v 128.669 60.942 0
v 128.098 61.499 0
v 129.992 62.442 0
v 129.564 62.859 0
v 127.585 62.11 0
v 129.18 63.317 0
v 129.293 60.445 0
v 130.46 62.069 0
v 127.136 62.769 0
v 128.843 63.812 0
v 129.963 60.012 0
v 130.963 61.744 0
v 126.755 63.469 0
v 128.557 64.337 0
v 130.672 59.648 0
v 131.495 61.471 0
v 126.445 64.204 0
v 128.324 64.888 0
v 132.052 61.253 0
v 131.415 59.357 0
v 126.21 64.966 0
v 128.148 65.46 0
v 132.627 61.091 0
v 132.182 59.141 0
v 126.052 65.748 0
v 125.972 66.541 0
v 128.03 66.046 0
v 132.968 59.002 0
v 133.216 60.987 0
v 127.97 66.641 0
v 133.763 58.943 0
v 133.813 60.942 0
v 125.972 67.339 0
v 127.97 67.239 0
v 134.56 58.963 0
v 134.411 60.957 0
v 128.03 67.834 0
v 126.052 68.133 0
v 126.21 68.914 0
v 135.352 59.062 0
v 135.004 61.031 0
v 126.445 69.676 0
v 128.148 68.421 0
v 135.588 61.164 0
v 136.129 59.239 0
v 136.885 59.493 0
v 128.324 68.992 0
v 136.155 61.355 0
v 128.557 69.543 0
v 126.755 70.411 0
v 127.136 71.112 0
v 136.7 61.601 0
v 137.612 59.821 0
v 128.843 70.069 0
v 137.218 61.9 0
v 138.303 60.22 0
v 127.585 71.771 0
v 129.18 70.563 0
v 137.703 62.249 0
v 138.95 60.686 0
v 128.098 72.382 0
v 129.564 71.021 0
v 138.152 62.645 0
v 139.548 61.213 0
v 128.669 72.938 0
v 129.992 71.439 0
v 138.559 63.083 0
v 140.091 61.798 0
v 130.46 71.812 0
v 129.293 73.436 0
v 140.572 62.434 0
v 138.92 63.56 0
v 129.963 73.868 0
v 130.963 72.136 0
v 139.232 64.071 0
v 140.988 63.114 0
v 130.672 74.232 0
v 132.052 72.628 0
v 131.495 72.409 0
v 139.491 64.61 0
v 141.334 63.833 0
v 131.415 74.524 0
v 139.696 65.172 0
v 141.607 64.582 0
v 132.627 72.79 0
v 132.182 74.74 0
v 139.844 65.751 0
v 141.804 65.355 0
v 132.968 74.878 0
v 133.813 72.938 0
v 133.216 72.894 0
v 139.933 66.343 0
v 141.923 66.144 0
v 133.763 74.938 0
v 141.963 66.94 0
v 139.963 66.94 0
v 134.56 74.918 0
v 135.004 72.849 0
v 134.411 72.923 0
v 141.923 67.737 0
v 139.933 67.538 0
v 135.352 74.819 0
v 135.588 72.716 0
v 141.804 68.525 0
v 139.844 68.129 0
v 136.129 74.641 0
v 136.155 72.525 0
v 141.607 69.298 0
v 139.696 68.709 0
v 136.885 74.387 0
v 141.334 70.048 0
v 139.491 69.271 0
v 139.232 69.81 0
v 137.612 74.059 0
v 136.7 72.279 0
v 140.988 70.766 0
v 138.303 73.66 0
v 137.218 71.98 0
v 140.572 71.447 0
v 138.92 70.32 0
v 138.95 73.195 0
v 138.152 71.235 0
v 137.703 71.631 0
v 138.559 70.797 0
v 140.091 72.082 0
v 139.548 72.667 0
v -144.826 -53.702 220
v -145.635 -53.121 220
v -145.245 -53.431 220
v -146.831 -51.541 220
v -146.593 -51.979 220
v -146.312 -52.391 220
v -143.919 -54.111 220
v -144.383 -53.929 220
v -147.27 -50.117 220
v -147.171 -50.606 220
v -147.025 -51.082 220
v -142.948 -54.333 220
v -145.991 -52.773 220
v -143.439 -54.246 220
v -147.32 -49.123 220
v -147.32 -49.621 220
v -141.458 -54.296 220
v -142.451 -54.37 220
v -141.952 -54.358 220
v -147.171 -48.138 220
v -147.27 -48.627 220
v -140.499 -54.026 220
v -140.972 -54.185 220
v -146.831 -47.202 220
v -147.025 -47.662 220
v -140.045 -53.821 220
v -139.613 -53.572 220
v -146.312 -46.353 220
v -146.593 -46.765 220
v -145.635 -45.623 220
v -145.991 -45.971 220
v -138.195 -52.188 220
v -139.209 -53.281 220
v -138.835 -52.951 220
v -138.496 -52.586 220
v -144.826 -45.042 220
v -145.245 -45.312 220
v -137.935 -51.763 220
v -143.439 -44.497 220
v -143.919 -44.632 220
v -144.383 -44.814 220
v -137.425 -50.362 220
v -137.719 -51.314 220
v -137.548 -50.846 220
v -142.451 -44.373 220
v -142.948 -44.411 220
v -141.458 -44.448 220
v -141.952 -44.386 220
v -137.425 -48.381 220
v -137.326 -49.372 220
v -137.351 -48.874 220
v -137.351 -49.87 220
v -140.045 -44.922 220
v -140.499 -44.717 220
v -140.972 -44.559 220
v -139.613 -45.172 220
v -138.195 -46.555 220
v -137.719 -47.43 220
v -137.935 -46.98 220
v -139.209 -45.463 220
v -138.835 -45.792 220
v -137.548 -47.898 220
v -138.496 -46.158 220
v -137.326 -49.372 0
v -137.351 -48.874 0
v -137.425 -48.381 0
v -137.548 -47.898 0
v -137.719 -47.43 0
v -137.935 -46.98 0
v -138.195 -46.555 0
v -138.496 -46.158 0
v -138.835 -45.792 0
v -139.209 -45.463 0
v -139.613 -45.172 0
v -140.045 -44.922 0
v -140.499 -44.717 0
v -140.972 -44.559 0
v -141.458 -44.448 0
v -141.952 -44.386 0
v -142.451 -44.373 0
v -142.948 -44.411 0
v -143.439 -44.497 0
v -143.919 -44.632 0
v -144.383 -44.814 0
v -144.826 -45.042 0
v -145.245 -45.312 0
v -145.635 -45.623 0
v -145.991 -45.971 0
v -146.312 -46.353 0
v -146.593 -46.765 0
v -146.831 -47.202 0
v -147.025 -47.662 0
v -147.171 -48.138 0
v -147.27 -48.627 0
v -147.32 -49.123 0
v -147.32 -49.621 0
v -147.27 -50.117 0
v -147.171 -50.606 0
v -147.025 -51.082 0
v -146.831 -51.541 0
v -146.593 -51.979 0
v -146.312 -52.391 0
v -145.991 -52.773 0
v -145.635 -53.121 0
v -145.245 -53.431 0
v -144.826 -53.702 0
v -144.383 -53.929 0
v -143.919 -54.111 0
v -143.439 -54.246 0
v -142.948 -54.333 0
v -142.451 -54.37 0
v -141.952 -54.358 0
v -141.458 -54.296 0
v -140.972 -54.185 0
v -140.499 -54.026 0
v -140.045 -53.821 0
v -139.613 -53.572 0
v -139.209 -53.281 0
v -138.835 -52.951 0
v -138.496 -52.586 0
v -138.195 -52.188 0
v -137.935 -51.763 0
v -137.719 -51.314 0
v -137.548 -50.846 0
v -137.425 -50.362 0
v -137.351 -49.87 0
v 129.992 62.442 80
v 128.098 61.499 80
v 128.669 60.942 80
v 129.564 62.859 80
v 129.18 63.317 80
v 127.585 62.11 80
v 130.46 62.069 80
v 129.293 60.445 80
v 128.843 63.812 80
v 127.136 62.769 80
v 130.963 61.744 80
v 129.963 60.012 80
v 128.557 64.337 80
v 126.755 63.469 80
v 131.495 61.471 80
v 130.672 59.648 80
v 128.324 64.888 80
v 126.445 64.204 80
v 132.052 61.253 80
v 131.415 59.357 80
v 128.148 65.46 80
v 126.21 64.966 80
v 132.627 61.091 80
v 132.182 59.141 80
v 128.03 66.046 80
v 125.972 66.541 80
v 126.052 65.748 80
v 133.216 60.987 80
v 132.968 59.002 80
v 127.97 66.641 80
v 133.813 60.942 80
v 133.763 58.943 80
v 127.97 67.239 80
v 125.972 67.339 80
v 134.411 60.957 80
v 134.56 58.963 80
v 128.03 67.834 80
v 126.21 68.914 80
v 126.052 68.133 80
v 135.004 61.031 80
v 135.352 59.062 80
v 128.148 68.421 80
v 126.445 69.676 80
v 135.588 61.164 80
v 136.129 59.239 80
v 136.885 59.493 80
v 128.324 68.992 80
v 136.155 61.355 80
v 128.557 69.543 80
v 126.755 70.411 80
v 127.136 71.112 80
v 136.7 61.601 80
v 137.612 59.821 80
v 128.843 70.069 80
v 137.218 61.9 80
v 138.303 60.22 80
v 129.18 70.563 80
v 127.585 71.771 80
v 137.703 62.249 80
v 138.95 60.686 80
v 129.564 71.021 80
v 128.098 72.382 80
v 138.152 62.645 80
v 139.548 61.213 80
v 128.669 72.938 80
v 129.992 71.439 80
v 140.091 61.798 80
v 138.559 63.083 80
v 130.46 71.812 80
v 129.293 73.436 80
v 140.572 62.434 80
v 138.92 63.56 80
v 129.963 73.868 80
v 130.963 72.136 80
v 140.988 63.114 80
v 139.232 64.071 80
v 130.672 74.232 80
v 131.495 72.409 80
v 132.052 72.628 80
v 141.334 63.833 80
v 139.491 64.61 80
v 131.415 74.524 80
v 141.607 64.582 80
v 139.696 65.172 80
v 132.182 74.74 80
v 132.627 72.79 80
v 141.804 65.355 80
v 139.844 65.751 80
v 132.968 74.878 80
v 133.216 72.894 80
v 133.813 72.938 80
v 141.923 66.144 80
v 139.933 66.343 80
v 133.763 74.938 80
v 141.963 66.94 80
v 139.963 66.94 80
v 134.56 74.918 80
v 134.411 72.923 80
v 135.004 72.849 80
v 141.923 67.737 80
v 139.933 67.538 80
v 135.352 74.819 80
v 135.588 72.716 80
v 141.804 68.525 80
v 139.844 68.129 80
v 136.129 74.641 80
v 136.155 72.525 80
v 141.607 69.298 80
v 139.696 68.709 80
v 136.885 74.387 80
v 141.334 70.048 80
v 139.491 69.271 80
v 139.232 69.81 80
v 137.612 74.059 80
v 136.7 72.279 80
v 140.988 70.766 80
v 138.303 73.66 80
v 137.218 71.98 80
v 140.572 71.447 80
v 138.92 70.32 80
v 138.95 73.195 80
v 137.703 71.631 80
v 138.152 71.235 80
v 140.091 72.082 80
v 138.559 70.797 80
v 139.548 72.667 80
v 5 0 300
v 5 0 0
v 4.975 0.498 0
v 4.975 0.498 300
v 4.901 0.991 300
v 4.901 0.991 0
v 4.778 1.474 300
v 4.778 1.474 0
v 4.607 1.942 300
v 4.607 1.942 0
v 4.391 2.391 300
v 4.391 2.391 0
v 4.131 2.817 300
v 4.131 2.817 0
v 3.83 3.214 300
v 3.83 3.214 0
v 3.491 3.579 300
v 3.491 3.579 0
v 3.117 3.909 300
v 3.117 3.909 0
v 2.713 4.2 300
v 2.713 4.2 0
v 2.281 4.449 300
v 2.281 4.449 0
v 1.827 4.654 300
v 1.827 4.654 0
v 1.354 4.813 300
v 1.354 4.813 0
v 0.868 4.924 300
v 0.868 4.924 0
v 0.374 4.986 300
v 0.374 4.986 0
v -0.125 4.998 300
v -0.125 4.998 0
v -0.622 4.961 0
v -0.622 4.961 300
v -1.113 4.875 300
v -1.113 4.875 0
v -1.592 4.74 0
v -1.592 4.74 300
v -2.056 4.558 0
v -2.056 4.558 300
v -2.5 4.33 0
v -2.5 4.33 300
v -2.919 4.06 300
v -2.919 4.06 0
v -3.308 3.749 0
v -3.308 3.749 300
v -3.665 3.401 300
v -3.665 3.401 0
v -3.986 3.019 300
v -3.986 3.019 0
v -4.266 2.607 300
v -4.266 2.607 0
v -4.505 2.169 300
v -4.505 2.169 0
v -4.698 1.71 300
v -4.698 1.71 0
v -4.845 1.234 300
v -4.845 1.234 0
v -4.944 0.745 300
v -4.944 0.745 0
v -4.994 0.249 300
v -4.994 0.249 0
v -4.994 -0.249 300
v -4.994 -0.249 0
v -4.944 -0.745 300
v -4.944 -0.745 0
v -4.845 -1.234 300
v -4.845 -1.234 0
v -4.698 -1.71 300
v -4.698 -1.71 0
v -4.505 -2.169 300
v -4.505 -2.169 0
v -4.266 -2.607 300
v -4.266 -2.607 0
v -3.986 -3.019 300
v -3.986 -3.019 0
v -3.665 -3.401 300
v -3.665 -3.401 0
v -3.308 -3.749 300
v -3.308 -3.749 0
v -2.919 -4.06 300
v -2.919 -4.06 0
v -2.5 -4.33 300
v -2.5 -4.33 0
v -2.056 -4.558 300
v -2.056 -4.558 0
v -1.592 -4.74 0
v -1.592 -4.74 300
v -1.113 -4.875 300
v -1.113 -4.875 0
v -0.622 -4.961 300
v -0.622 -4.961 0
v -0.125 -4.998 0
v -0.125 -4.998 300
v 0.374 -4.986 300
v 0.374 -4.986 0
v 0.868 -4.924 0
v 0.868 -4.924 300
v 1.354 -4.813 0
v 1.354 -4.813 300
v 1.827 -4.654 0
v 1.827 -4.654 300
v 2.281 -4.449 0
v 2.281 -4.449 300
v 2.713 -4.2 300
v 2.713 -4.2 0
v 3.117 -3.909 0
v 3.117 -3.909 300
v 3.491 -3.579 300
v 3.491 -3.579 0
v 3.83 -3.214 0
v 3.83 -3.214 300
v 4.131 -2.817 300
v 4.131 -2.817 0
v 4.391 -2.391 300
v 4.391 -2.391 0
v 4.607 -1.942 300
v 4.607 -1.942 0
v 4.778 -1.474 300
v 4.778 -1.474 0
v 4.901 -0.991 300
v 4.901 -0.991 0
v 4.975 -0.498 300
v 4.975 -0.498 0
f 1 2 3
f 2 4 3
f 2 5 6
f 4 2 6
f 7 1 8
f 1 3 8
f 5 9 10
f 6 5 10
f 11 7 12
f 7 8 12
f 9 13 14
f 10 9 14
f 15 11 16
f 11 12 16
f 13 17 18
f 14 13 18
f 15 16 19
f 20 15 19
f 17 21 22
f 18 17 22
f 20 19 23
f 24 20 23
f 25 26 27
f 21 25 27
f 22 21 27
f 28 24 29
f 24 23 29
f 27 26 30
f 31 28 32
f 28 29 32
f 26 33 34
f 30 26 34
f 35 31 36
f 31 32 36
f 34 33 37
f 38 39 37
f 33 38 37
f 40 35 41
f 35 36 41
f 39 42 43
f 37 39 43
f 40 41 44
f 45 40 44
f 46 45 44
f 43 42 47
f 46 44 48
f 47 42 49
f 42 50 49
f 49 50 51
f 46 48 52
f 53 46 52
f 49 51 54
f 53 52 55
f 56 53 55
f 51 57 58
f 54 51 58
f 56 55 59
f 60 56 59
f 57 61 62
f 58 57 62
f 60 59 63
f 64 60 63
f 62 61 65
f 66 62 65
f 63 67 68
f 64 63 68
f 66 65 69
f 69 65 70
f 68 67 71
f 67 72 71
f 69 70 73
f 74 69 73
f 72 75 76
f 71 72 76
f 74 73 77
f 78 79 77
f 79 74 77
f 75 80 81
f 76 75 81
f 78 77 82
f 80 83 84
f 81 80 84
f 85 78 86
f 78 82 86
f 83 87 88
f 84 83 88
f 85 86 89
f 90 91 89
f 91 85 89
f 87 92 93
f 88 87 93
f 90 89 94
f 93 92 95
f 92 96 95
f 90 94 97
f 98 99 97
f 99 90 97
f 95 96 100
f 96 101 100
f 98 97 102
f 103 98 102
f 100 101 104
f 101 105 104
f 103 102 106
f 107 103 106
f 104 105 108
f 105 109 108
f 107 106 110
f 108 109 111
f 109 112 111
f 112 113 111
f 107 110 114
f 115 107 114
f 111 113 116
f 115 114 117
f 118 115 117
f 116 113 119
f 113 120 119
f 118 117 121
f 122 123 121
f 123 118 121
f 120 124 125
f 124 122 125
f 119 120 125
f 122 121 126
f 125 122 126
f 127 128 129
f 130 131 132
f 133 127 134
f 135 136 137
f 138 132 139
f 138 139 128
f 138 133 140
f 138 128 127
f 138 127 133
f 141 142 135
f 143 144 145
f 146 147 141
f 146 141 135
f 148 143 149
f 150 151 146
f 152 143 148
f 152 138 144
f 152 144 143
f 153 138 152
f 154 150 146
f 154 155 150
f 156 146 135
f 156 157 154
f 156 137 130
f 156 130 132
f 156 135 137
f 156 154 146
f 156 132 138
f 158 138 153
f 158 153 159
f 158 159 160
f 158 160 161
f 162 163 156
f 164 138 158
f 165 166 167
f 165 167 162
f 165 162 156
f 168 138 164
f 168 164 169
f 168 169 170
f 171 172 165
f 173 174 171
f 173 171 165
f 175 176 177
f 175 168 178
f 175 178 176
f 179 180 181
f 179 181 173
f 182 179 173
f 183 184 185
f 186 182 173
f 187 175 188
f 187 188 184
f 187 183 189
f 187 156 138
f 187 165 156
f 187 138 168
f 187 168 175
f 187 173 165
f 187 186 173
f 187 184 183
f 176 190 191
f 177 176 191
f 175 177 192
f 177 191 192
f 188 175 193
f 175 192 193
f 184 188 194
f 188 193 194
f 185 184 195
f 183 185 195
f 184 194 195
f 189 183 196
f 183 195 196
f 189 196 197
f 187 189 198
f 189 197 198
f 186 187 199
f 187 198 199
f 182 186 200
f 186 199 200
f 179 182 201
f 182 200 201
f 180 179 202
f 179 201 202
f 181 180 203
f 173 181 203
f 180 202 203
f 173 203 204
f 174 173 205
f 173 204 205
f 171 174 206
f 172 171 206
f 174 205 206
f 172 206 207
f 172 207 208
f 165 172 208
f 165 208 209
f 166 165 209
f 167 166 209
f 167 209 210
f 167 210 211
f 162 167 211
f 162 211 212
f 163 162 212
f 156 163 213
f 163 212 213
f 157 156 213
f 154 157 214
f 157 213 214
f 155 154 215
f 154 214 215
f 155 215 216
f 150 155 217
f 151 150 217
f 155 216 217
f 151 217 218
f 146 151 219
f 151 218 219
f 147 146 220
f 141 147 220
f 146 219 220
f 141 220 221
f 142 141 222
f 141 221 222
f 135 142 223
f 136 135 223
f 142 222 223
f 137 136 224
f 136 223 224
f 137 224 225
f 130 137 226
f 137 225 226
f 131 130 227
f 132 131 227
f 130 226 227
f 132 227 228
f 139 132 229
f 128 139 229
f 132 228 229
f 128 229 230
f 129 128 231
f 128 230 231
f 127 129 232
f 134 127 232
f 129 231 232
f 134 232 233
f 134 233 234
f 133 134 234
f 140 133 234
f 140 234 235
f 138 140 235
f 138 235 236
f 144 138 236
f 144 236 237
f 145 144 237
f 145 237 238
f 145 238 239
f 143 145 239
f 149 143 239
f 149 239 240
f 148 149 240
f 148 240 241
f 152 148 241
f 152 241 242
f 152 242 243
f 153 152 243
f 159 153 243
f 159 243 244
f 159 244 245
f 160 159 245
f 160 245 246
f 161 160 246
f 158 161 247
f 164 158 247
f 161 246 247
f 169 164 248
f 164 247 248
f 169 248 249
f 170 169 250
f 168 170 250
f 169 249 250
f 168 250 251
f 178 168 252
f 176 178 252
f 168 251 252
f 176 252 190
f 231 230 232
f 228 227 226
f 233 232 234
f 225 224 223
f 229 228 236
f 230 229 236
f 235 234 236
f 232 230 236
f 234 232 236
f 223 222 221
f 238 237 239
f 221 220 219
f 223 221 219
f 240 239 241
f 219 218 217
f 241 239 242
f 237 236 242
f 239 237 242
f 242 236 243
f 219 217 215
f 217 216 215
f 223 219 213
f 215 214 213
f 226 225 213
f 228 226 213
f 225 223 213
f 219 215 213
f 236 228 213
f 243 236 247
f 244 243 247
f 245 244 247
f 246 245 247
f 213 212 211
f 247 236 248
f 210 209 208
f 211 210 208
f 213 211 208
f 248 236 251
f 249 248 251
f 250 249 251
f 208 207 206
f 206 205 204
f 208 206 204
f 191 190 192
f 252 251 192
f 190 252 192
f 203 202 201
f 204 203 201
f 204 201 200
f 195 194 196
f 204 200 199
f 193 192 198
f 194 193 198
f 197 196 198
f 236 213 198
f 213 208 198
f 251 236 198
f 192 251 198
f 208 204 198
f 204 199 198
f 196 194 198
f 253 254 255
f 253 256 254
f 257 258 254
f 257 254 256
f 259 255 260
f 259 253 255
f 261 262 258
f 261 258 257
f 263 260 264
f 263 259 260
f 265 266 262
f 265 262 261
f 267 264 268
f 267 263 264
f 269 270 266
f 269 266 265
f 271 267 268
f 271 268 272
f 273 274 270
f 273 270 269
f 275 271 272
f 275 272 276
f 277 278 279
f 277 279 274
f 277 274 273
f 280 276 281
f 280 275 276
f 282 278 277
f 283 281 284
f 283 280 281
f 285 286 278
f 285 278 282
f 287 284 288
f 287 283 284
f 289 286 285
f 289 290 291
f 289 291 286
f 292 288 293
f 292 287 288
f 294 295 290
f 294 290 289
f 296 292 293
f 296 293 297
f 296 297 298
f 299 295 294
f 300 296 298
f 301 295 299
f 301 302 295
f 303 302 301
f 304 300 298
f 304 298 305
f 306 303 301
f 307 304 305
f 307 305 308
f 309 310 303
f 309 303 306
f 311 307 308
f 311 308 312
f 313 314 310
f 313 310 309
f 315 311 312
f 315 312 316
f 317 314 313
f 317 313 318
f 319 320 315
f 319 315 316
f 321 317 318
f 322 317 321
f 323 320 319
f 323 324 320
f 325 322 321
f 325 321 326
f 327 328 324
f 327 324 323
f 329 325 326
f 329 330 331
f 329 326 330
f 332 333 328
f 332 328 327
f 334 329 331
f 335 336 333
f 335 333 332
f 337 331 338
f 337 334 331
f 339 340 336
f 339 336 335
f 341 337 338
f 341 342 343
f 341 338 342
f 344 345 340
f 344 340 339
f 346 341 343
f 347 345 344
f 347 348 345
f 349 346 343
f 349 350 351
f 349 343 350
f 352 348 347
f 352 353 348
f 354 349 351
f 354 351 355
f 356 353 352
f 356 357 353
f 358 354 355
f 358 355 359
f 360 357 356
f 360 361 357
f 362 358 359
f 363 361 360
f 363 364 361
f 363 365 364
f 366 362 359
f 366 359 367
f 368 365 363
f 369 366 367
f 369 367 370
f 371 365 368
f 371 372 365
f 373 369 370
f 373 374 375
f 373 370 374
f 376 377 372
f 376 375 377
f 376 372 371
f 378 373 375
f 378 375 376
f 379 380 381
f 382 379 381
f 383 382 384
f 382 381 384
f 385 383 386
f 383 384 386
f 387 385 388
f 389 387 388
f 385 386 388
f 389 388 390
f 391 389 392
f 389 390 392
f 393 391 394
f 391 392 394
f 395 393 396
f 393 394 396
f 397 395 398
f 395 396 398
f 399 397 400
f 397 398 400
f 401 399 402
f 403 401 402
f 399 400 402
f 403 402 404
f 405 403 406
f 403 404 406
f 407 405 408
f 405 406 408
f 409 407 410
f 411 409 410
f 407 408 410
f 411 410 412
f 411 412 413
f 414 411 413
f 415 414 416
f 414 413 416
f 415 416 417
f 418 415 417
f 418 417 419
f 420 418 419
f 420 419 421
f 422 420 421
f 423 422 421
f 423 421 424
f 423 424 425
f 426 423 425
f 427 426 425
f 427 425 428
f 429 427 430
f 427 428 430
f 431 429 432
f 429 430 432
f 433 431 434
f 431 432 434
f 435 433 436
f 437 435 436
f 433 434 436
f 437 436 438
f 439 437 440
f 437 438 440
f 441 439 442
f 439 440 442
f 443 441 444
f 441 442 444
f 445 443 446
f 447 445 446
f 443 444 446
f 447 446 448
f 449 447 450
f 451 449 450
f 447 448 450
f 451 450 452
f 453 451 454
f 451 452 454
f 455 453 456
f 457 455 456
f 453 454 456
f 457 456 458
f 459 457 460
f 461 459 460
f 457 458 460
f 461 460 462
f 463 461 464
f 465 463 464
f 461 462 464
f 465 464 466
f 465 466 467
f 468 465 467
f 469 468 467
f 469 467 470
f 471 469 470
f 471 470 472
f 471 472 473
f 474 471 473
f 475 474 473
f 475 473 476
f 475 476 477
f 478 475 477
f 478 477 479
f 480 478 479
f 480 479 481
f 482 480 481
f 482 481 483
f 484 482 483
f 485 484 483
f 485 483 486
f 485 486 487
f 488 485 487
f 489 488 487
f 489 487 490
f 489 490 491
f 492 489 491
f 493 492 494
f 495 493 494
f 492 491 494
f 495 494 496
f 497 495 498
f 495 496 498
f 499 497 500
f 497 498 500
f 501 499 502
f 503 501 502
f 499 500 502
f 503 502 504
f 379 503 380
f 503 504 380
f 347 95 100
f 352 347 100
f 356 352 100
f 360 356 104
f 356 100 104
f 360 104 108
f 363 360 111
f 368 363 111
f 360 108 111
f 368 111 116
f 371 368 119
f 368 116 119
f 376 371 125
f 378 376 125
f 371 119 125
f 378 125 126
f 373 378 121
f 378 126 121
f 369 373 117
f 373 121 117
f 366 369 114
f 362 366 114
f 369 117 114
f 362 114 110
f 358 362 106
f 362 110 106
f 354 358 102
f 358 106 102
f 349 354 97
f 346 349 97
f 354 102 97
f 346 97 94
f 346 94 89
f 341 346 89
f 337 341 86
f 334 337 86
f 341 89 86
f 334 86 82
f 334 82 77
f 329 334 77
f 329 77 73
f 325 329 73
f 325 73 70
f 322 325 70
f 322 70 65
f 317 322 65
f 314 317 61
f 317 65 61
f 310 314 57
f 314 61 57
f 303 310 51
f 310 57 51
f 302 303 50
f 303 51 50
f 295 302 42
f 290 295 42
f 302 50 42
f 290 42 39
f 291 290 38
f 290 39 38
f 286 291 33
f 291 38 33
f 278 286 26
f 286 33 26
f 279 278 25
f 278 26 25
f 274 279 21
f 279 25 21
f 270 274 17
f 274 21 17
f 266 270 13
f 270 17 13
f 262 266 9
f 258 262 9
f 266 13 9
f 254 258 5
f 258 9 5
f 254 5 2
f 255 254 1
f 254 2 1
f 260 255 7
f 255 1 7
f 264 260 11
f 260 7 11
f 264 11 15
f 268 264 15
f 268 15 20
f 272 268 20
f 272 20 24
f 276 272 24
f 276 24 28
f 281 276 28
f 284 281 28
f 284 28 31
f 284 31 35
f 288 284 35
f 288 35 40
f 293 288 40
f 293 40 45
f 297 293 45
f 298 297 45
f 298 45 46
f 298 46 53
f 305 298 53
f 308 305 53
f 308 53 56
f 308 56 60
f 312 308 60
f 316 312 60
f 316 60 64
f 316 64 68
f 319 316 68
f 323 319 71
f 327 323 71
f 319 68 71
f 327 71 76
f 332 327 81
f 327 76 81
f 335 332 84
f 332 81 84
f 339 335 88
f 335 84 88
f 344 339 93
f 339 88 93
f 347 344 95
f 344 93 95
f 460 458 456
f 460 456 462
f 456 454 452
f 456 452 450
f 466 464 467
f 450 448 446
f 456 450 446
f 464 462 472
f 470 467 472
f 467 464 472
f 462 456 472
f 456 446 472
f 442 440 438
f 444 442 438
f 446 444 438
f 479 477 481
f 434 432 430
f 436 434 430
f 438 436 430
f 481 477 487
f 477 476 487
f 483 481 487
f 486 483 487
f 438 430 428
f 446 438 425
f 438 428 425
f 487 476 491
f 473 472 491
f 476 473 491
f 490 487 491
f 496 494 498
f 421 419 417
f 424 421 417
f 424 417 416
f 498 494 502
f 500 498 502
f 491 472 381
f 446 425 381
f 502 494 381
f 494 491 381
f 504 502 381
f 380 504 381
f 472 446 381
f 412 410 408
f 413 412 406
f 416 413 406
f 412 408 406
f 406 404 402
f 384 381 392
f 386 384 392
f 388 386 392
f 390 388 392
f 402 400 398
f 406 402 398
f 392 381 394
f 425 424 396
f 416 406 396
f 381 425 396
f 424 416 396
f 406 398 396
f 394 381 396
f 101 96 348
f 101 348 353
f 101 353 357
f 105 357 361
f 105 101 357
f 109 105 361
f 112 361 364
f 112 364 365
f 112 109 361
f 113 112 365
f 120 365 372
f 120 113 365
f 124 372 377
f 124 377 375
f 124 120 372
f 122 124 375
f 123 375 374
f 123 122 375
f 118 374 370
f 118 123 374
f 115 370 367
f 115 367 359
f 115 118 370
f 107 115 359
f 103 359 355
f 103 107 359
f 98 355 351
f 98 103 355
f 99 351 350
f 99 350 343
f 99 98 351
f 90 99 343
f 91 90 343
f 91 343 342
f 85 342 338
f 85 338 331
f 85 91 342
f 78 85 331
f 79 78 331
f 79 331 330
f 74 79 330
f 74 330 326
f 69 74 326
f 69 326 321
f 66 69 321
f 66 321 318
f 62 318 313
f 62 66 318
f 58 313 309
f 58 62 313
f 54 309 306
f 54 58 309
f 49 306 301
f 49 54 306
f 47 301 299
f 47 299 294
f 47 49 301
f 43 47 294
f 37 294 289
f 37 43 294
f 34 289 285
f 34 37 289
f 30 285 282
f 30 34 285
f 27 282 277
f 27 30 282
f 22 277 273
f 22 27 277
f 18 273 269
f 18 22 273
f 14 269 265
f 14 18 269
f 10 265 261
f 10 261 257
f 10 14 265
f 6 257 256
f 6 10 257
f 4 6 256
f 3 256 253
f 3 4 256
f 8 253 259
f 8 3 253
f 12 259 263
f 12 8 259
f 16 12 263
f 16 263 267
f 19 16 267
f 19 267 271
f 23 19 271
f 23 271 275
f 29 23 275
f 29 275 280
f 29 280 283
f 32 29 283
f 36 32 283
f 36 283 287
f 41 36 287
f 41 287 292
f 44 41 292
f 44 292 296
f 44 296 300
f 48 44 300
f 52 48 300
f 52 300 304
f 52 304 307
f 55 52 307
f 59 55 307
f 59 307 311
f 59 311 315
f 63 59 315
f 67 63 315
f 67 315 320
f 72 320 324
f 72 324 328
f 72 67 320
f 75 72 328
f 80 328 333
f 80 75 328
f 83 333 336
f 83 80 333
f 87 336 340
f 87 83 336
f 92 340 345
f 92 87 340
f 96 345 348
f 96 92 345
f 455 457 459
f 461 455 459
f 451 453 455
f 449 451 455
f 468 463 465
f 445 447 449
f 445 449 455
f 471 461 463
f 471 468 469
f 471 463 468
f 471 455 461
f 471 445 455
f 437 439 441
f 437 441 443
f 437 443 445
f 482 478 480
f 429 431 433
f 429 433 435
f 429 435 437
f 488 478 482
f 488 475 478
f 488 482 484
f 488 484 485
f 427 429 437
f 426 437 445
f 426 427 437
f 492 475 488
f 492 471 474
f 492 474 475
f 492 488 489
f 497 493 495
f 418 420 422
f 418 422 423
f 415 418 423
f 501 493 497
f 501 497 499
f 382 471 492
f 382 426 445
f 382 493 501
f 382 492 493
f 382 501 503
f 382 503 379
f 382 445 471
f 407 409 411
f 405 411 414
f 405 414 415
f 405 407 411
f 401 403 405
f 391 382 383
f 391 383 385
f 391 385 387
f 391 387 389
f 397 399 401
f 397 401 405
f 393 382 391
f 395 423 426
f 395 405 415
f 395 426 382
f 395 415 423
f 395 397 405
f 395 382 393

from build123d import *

# Parameters (mm, degrees)
F0_R     = 5
F1_DEPTH = 300
F2_R     = 5
F3_DEPTH = 220
F4_R     = 8
F4_R_2   = 6
F5_DEPTH = 80


with BuildPart() as f1:
    # F0 (on Top) → F1 (new body)
    with BuildSketch(Plane.XY):
        Circle(F0_R)
    extrude(amount=F1_DEPTH)


with BuildPart() as f3:
    # F2 (on Top) → F3 (new body)
    with BuildSketch(Plane.XY):
        with Locations((-142.326102, -49.371749)):
            Circle(F2_R)
    extrude(amount=F3_DEPTH)


with BuildPart() as f5:
    # F4 (on Top) → F5 (new body)
    with BuildSketch(Plane.XY):
        with Locations((133.962542, 66.940188)):
            Circle(F4_R)
        with Locations((133.962542, 66.940188)):
            Circle(F4_R_2, mode=Mode.SUBTRACT)
    extrude(amount=F5_DEPTH)


solid = Compound([f1.part, f3.part, f5.part])
